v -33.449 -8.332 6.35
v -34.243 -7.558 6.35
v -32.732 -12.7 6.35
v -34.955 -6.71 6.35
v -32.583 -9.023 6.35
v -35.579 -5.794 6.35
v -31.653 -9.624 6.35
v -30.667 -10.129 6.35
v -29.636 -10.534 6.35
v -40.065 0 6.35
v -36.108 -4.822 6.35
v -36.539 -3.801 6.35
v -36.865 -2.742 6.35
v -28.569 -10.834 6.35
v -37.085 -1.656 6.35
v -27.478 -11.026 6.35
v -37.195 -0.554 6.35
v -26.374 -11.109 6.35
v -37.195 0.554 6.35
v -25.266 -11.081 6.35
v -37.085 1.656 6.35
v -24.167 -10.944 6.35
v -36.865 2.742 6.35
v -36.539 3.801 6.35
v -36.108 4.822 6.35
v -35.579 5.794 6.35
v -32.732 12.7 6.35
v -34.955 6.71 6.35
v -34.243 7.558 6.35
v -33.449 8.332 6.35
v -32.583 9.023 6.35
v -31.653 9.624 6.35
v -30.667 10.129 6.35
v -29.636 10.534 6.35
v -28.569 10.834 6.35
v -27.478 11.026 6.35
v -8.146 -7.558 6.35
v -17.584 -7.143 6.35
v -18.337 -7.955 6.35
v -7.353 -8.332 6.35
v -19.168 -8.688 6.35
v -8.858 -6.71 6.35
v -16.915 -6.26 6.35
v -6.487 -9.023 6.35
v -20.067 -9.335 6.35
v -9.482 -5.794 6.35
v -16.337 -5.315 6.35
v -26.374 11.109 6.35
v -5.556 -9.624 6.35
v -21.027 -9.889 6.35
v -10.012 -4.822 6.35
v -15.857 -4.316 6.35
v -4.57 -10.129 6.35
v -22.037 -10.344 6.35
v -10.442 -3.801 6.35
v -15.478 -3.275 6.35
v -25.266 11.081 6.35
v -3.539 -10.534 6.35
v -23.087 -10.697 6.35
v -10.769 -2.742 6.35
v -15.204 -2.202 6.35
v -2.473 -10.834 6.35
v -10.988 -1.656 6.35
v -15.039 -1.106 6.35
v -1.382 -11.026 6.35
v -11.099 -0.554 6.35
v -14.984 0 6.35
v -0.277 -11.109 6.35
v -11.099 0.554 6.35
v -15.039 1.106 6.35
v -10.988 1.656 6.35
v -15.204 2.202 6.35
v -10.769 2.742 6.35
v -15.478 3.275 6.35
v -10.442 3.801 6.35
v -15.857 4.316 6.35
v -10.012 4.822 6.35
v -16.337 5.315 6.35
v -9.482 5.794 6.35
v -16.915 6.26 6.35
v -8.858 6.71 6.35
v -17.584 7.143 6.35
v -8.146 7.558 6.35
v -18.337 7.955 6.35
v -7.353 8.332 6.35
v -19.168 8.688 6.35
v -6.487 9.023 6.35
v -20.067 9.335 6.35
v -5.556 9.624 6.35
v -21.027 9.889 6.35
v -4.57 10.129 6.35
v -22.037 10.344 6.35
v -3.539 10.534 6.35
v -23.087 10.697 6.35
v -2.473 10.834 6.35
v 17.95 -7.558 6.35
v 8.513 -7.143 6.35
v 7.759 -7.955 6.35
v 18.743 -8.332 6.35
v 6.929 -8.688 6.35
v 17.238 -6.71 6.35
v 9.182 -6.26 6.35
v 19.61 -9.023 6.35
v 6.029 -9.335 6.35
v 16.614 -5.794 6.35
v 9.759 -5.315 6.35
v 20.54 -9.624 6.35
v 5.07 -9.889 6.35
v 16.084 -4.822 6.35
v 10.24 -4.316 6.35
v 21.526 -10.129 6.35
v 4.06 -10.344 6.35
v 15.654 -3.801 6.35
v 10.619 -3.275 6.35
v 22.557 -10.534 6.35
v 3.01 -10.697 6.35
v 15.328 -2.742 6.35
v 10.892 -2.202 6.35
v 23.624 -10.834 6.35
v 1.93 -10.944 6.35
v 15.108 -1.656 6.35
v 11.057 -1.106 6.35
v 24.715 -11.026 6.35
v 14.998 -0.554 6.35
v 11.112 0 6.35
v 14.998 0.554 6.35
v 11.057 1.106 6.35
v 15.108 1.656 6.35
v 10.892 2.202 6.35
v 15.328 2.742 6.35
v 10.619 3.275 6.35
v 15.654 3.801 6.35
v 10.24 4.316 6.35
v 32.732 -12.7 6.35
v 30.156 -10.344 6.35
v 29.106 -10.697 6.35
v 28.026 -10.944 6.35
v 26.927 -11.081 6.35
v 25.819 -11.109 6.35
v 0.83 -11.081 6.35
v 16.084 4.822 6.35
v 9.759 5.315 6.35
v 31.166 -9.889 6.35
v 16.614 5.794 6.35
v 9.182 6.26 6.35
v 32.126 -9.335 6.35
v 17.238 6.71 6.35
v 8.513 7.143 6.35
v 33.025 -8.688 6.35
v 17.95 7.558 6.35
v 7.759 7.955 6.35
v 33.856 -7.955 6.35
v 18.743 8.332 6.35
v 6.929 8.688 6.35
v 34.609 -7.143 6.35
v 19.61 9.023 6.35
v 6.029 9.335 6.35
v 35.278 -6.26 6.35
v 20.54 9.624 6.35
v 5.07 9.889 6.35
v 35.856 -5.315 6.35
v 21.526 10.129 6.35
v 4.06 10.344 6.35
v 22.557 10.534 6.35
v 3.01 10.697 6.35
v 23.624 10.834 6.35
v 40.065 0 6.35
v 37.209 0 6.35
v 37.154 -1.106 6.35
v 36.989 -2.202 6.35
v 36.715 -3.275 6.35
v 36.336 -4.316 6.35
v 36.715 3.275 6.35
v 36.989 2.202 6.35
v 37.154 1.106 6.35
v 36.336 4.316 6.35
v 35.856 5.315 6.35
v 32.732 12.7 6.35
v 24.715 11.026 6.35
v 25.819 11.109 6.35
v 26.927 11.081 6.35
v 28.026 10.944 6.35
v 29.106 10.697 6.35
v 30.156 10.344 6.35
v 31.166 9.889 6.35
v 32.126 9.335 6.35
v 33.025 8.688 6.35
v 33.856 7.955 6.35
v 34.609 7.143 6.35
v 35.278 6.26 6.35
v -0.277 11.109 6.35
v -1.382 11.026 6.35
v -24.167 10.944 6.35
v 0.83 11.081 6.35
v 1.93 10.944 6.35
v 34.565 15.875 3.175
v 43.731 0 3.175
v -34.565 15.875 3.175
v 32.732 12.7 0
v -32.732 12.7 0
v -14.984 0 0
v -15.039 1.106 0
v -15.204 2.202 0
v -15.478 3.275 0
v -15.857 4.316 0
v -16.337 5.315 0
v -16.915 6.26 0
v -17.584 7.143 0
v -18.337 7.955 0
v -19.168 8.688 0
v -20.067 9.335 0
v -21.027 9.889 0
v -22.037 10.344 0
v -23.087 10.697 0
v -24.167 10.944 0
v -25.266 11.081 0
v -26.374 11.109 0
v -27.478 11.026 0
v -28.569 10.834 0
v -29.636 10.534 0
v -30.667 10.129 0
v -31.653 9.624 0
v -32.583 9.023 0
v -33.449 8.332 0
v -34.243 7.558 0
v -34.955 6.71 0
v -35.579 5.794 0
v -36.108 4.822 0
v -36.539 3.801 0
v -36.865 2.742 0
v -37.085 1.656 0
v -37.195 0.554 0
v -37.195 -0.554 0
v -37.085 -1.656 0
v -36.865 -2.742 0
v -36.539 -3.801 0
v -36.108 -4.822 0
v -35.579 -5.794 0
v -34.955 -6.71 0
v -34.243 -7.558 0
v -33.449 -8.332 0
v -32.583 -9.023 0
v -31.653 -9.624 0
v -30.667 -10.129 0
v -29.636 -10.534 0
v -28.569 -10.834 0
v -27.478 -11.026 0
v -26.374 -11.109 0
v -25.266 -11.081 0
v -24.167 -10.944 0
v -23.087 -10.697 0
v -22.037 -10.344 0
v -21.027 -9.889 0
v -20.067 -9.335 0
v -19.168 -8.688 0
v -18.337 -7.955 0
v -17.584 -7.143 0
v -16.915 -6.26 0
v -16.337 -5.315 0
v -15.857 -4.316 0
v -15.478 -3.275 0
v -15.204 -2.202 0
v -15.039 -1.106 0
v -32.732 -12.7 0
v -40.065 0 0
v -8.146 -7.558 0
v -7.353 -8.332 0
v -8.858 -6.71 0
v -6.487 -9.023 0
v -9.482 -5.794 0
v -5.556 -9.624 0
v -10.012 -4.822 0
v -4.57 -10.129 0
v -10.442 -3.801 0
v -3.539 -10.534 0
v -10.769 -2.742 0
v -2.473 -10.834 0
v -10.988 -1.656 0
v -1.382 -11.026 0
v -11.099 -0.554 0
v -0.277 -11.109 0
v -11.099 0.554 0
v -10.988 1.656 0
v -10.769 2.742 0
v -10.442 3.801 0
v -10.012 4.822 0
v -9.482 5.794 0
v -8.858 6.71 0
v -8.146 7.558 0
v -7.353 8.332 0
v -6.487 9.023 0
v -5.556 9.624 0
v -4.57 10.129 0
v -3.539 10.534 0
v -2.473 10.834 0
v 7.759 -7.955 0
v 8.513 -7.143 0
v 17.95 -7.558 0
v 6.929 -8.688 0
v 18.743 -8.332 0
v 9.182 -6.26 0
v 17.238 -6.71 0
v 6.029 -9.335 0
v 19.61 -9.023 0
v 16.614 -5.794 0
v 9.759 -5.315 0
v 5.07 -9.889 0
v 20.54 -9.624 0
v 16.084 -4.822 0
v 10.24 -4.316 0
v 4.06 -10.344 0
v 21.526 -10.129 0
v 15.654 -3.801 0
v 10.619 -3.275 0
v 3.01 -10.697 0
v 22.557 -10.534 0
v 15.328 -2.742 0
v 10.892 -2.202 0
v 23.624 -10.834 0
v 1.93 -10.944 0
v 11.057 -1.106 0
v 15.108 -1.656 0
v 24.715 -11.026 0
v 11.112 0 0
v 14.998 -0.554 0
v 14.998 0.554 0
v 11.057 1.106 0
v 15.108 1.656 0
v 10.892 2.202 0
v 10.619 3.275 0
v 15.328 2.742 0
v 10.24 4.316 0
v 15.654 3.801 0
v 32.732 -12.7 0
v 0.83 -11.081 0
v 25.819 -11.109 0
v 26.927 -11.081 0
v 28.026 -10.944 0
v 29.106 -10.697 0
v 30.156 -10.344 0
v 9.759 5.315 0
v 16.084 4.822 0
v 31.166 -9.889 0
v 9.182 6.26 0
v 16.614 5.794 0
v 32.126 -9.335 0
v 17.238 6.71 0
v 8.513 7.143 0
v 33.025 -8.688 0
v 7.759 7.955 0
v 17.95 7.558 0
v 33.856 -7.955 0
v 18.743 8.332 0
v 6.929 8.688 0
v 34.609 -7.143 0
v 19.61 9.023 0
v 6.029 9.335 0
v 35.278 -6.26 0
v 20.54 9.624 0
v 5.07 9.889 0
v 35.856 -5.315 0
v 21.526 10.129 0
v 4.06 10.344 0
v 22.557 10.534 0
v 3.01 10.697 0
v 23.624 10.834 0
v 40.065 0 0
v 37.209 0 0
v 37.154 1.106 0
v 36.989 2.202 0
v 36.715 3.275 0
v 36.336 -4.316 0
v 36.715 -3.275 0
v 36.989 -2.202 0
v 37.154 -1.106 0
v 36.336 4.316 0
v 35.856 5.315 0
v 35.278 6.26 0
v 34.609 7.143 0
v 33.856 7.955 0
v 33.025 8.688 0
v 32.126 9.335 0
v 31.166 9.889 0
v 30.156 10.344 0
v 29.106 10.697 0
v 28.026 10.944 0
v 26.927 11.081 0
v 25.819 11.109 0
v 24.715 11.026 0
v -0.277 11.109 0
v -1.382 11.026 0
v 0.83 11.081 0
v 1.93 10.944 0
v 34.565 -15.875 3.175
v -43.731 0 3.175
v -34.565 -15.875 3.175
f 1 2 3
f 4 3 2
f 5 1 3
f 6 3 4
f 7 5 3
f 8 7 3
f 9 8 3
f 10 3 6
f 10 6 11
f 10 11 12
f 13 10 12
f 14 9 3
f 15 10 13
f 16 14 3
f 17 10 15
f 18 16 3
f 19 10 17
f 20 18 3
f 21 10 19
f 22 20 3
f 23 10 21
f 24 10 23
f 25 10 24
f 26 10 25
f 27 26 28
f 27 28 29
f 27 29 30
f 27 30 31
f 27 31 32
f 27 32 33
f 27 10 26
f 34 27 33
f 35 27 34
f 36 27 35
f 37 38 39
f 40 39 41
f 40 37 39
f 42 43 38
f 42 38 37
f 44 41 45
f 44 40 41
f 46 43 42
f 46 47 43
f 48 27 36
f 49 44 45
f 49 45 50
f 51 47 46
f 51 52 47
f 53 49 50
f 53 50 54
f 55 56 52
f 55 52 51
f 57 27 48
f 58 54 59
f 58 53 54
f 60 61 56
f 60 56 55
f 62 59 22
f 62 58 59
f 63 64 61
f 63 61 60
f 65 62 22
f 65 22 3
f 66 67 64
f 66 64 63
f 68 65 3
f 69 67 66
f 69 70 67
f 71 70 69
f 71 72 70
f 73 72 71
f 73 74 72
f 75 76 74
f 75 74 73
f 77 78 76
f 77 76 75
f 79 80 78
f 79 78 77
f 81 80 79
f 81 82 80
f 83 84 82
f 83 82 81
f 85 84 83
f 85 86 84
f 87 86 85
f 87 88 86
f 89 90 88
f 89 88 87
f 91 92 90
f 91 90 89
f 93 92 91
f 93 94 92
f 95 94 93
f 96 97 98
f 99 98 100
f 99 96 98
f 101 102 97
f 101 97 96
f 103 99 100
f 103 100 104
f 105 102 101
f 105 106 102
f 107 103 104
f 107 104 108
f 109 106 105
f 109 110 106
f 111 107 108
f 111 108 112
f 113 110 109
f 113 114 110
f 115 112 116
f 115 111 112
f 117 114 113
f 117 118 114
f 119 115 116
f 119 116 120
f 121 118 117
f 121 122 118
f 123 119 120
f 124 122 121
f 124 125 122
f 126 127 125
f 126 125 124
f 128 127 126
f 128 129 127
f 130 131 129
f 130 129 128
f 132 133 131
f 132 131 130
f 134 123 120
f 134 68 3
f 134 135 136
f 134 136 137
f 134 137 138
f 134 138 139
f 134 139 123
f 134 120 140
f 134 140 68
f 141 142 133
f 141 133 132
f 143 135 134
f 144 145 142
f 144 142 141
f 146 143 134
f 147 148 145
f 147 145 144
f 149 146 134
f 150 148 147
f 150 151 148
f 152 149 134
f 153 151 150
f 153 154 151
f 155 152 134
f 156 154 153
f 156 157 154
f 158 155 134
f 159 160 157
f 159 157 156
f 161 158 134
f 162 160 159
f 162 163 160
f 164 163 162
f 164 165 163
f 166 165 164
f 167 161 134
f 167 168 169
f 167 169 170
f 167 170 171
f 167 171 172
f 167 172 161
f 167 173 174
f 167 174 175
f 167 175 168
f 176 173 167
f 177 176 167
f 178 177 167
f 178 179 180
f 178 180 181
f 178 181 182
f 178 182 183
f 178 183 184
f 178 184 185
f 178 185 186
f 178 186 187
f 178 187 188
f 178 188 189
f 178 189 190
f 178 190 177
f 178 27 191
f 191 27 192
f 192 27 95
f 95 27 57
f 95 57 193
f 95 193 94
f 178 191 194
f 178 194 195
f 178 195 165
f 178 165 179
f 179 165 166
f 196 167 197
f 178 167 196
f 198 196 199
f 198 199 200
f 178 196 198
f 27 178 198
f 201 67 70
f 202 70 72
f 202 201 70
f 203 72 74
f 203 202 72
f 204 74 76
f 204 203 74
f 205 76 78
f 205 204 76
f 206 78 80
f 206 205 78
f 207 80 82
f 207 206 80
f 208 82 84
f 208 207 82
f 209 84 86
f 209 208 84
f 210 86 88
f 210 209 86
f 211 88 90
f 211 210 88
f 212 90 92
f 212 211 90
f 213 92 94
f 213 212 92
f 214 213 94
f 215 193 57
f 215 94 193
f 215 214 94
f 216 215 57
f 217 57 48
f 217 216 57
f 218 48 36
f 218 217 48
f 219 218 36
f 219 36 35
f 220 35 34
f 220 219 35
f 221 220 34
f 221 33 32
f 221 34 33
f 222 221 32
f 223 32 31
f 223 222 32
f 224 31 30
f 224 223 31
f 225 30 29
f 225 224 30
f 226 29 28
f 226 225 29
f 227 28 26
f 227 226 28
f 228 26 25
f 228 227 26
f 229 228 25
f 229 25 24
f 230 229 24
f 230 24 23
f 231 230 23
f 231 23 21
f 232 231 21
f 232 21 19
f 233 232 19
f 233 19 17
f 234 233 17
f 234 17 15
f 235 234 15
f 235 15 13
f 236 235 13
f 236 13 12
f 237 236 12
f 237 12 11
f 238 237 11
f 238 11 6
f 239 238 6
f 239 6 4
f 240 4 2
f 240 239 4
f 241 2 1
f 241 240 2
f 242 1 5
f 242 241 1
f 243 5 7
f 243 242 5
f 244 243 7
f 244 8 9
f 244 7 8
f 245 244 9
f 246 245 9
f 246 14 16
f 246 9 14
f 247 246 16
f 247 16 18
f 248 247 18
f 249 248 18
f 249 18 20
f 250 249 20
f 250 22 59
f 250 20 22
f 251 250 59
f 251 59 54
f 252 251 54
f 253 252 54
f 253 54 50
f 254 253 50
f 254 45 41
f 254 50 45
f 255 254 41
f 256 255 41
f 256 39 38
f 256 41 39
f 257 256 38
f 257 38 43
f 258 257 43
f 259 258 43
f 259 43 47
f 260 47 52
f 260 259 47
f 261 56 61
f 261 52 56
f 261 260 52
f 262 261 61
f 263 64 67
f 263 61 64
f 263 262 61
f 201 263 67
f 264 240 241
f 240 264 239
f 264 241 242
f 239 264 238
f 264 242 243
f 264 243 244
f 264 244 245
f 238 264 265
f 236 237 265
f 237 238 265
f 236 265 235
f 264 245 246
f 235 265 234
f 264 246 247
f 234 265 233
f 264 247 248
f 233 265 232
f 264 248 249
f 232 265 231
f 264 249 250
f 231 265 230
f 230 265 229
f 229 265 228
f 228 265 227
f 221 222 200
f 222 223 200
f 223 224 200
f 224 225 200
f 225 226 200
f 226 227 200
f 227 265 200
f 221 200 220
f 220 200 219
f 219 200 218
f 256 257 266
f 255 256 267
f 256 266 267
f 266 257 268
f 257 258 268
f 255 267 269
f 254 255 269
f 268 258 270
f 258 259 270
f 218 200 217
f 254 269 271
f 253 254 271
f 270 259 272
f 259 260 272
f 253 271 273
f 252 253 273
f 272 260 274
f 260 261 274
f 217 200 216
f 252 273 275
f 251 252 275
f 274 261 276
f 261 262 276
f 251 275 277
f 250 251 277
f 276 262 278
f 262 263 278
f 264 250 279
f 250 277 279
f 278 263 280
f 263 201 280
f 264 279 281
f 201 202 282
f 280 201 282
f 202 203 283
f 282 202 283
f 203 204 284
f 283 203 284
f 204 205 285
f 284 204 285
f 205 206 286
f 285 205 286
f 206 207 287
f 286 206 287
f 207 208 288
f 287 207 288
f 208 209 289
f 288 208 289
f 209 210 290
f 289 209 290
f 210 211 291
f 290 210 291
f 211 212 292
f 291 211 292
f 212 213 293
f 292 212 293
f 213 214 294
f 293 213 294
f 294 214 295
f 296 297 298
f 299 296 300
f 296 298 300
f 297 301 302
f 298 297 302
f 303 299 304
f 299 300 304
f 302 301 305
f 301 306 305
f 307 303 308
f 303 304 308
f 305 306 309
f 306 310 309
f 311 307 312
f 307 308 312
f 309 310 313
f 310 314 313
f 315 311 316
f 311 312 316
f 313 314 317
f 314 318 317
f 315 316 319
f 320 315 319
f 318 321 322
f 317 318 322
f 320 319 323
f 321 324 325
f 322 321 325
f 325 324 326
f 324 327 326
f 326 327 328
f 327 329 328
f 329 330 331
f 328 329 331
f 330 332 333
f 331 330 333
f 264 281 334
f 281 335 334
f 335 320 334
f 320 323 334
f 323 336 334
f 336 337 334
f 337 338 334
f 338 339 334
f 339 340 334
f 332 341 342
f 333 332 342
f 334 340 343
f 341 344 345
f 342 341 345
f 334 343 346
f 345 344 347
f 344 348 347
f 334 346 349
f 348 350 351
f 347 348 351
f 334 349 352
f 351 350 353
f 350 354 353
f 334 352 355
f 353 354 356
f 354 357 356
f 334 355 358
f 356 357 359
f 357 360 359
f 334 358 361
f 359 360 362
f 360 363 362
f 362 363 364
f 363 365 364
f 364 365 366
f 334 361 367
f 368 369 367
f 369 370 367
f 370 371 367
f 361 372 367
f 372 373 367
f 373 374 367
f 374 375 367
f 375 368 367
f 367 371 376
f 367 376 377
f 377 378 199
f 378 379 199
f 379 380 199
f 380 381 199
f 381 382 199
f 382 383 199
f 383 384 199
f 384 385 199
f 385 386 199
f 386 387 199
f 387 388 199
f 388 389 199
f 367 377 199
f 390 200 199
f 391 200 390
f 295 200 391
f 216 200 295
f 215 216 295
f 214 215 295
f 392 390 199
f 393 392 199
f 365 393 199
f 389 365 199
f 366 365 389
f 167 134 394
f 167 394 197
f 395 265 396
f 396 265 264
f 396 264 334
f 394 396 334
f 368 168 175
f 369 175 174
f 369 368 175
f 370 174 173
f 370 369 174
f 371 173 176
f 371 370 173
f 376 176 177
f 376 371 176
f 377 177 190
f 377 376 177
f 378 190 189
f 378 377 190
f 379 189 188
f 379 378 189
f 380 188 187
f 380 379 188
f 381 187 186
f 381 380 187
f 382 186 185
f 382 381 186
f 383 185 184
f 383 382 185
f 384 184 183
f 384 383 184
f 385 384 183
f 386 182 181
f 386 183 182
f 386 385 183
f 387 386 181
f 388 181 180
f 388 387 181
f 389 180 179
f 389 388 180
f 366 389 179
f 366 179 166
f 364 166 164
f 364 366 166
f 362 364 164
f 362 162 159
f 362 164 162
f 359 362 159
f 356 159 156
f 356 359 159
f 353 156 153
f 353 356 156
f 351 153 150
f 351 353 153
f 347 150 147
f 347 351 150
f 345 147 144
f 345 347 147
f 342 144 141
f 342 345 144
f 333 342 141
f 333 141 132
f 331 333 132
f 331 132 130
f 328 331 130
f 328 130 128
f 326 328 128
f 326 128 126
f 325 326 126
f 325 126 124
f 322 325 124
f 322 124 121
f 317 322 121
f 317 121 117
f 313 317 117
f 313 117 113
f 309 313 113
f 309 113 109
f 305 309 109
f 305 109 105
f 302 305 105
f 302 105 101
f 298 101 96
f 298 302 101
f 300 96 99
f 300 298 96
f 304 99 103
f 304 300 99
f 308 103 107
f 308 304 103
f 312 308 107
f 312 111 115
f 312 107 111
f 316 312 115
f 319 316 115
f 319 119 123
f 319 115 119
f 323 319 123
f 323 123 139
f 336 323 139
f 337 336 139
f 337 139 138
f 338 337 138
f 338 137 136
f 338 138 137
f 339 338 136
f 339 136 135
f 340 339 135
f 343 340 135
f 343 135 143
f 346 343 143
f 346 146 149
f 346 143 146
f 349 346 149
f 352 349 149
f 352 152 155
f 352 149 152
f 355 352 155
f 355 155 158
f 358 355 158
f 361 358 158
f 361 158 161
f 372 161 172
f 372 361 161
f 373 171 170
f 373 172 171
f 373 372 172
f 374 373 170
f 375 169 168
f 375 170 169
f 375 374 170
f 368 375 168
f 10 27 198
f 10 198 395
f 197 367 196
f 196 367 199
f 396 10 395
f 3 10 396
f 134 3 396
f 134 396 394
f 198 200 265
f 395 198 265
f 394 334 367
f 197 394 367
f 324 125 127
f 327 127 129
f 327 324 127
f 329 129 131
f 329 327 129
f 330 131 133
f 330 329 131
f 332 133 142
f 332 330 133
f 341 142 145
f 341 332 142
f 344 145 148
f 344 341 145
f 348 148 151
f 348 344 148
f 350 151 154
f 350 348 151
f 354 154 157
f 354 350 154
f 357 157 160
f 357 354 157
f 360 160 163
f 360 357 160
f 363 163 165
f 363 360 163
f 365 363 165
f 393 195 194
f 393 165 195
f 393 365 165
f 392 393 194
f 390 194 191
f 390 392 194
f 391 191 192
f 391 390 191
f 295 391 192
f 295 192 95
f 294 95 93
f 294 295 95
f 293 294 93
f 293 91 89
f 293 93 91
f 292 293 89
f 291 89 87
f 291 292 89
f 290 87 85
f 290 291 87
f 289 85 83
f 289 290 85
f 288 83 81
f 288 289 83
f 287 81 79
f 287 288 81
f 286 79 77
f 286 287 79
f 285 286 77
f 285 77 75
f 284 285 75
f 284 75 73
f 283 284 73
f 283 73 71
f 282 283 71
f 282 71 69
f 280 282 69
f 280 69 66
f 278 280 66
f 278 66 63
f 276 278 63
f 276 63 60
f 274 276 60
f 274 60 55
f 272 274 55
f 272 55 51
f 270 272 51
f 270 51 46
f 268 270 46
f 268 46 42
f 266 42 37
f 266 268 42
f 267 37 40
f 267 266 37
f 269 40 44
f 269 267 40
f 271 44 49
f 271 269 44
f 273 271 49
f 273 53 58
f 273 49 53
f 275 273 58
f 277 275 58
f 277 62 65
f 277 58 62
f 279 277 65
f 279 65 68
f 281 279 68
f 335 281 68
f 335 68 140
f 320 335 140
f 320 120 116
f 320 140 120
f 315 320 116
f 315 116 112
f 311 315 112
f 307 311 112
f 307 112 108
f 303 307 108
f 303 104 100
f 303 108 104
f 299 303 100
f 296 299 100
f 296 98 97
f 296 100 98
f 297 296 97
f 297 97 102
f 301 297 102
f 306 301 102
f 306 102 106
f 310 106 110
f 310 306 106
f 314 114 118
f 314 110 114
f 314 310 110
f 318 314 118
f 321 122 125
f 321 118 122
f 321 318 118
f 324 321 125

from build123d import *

# Parameters (mm, degrees)
F1_DEPTH = 6.35
F3_SIZE  = 3.17499
F4_SIZE  = 3.17499
F2_R     = 11.1125
F5_DEPTH = 25.4
F6_R     = 11.1125
F7_DEPTH = 25.4


# Not quite as in the source:
# - a fillet or chamfer is up to 0.001 mm smaller than in the source, because OpenCascade refuses the exact size


with BuildPart() as f1:
    # F0 (on Top) → F1 (new body)
    with BuildSketch(Plane.XY):
        Polygon((25.4, -15.875), (25.4, 15.875), (16.2345644766, 15.875), (7.0691289532, 0), (16.2345644766, -15.875), align=None)
        Polygon((34.5654355234, 15.875), (25.4, 15.875), (25.4, -15.875), (34.5654355234, -15.875), (43.7308710468, 0), align=None)
        Polygon((7.0691289532, 0), (16.2345644766, 15.875), (-16.2345644766, 15.875), (-7.0691289532, 0), (-16.2345644766, -15.875), (16.2345644766, -15.875), align=None)
        Polygon((-7.0691289532, 0), (-16.2345644766, 15.875), (-25.4, 15.875), (-25.4, -15.875), (-16.2345644766, -15.875), align=None)
        Polygon((-25.4, -15.875), (-25.4, 15.875), (-34.5654355234, 15.875), (-43.7308710468, 0), (-34.5654355234, -15.875), align=None)
    extrude(amount=F1_DEPTH)

    # F3 (size 3.175 in the source; OpenCascade refuses exactly that, so slightly less here)
    f3_edges = [f1.edges().sort_by_distance(p)[0] for p in [
        (-39.148153, -7.9375, 0),
        (-39.148153, 7.9375, 6.35),
        (-39.148153, -7.9375, 6.35),
        (-39.148153, 7.9375, 0),
        (39.148153, -7.9375, 6.35),
        (39.148153, 7.9375, 6.35),
        (39.148153, 7.9375, 0),
        (39.148153, -7.9375, 0),
    ]]
    chamfer(f3_edges, length=F3_SIZE)

    # F4 (size 3.175 in the source; OpenCascade refuses exactly that, so slightly less here)
    f4_edges = [f1.edges().sort_by_distance(p)[0] for p in [
        (0, 15.875, 0),
        (0, 15.875, 6.35),
        (0, -15.875, 6.35),
        (0, -15.875, 0),
    ]]
    chamfer(f4_edges, length=F4_SIZE)

    # F2 (on Top) → F5 (cut)
    with BuildSketch(Plane.XY):
        Circle(F2_R)
    extrude(amount=F5_DEPTH, mode=Mode.SUBTRACT)

    # F6 (on Top) → F7 (cut)
    with BuildSketch(Plane.XY):
        with Locations((26.0964684711, 0)):
            Circle(F6_R)
        with Locations((-26.0964684711, 0)):
            Circle(F6_R)
    extrude(amount=F7_DEPTH, mode=Mode.SUBTRACT)


solid = f1.part
